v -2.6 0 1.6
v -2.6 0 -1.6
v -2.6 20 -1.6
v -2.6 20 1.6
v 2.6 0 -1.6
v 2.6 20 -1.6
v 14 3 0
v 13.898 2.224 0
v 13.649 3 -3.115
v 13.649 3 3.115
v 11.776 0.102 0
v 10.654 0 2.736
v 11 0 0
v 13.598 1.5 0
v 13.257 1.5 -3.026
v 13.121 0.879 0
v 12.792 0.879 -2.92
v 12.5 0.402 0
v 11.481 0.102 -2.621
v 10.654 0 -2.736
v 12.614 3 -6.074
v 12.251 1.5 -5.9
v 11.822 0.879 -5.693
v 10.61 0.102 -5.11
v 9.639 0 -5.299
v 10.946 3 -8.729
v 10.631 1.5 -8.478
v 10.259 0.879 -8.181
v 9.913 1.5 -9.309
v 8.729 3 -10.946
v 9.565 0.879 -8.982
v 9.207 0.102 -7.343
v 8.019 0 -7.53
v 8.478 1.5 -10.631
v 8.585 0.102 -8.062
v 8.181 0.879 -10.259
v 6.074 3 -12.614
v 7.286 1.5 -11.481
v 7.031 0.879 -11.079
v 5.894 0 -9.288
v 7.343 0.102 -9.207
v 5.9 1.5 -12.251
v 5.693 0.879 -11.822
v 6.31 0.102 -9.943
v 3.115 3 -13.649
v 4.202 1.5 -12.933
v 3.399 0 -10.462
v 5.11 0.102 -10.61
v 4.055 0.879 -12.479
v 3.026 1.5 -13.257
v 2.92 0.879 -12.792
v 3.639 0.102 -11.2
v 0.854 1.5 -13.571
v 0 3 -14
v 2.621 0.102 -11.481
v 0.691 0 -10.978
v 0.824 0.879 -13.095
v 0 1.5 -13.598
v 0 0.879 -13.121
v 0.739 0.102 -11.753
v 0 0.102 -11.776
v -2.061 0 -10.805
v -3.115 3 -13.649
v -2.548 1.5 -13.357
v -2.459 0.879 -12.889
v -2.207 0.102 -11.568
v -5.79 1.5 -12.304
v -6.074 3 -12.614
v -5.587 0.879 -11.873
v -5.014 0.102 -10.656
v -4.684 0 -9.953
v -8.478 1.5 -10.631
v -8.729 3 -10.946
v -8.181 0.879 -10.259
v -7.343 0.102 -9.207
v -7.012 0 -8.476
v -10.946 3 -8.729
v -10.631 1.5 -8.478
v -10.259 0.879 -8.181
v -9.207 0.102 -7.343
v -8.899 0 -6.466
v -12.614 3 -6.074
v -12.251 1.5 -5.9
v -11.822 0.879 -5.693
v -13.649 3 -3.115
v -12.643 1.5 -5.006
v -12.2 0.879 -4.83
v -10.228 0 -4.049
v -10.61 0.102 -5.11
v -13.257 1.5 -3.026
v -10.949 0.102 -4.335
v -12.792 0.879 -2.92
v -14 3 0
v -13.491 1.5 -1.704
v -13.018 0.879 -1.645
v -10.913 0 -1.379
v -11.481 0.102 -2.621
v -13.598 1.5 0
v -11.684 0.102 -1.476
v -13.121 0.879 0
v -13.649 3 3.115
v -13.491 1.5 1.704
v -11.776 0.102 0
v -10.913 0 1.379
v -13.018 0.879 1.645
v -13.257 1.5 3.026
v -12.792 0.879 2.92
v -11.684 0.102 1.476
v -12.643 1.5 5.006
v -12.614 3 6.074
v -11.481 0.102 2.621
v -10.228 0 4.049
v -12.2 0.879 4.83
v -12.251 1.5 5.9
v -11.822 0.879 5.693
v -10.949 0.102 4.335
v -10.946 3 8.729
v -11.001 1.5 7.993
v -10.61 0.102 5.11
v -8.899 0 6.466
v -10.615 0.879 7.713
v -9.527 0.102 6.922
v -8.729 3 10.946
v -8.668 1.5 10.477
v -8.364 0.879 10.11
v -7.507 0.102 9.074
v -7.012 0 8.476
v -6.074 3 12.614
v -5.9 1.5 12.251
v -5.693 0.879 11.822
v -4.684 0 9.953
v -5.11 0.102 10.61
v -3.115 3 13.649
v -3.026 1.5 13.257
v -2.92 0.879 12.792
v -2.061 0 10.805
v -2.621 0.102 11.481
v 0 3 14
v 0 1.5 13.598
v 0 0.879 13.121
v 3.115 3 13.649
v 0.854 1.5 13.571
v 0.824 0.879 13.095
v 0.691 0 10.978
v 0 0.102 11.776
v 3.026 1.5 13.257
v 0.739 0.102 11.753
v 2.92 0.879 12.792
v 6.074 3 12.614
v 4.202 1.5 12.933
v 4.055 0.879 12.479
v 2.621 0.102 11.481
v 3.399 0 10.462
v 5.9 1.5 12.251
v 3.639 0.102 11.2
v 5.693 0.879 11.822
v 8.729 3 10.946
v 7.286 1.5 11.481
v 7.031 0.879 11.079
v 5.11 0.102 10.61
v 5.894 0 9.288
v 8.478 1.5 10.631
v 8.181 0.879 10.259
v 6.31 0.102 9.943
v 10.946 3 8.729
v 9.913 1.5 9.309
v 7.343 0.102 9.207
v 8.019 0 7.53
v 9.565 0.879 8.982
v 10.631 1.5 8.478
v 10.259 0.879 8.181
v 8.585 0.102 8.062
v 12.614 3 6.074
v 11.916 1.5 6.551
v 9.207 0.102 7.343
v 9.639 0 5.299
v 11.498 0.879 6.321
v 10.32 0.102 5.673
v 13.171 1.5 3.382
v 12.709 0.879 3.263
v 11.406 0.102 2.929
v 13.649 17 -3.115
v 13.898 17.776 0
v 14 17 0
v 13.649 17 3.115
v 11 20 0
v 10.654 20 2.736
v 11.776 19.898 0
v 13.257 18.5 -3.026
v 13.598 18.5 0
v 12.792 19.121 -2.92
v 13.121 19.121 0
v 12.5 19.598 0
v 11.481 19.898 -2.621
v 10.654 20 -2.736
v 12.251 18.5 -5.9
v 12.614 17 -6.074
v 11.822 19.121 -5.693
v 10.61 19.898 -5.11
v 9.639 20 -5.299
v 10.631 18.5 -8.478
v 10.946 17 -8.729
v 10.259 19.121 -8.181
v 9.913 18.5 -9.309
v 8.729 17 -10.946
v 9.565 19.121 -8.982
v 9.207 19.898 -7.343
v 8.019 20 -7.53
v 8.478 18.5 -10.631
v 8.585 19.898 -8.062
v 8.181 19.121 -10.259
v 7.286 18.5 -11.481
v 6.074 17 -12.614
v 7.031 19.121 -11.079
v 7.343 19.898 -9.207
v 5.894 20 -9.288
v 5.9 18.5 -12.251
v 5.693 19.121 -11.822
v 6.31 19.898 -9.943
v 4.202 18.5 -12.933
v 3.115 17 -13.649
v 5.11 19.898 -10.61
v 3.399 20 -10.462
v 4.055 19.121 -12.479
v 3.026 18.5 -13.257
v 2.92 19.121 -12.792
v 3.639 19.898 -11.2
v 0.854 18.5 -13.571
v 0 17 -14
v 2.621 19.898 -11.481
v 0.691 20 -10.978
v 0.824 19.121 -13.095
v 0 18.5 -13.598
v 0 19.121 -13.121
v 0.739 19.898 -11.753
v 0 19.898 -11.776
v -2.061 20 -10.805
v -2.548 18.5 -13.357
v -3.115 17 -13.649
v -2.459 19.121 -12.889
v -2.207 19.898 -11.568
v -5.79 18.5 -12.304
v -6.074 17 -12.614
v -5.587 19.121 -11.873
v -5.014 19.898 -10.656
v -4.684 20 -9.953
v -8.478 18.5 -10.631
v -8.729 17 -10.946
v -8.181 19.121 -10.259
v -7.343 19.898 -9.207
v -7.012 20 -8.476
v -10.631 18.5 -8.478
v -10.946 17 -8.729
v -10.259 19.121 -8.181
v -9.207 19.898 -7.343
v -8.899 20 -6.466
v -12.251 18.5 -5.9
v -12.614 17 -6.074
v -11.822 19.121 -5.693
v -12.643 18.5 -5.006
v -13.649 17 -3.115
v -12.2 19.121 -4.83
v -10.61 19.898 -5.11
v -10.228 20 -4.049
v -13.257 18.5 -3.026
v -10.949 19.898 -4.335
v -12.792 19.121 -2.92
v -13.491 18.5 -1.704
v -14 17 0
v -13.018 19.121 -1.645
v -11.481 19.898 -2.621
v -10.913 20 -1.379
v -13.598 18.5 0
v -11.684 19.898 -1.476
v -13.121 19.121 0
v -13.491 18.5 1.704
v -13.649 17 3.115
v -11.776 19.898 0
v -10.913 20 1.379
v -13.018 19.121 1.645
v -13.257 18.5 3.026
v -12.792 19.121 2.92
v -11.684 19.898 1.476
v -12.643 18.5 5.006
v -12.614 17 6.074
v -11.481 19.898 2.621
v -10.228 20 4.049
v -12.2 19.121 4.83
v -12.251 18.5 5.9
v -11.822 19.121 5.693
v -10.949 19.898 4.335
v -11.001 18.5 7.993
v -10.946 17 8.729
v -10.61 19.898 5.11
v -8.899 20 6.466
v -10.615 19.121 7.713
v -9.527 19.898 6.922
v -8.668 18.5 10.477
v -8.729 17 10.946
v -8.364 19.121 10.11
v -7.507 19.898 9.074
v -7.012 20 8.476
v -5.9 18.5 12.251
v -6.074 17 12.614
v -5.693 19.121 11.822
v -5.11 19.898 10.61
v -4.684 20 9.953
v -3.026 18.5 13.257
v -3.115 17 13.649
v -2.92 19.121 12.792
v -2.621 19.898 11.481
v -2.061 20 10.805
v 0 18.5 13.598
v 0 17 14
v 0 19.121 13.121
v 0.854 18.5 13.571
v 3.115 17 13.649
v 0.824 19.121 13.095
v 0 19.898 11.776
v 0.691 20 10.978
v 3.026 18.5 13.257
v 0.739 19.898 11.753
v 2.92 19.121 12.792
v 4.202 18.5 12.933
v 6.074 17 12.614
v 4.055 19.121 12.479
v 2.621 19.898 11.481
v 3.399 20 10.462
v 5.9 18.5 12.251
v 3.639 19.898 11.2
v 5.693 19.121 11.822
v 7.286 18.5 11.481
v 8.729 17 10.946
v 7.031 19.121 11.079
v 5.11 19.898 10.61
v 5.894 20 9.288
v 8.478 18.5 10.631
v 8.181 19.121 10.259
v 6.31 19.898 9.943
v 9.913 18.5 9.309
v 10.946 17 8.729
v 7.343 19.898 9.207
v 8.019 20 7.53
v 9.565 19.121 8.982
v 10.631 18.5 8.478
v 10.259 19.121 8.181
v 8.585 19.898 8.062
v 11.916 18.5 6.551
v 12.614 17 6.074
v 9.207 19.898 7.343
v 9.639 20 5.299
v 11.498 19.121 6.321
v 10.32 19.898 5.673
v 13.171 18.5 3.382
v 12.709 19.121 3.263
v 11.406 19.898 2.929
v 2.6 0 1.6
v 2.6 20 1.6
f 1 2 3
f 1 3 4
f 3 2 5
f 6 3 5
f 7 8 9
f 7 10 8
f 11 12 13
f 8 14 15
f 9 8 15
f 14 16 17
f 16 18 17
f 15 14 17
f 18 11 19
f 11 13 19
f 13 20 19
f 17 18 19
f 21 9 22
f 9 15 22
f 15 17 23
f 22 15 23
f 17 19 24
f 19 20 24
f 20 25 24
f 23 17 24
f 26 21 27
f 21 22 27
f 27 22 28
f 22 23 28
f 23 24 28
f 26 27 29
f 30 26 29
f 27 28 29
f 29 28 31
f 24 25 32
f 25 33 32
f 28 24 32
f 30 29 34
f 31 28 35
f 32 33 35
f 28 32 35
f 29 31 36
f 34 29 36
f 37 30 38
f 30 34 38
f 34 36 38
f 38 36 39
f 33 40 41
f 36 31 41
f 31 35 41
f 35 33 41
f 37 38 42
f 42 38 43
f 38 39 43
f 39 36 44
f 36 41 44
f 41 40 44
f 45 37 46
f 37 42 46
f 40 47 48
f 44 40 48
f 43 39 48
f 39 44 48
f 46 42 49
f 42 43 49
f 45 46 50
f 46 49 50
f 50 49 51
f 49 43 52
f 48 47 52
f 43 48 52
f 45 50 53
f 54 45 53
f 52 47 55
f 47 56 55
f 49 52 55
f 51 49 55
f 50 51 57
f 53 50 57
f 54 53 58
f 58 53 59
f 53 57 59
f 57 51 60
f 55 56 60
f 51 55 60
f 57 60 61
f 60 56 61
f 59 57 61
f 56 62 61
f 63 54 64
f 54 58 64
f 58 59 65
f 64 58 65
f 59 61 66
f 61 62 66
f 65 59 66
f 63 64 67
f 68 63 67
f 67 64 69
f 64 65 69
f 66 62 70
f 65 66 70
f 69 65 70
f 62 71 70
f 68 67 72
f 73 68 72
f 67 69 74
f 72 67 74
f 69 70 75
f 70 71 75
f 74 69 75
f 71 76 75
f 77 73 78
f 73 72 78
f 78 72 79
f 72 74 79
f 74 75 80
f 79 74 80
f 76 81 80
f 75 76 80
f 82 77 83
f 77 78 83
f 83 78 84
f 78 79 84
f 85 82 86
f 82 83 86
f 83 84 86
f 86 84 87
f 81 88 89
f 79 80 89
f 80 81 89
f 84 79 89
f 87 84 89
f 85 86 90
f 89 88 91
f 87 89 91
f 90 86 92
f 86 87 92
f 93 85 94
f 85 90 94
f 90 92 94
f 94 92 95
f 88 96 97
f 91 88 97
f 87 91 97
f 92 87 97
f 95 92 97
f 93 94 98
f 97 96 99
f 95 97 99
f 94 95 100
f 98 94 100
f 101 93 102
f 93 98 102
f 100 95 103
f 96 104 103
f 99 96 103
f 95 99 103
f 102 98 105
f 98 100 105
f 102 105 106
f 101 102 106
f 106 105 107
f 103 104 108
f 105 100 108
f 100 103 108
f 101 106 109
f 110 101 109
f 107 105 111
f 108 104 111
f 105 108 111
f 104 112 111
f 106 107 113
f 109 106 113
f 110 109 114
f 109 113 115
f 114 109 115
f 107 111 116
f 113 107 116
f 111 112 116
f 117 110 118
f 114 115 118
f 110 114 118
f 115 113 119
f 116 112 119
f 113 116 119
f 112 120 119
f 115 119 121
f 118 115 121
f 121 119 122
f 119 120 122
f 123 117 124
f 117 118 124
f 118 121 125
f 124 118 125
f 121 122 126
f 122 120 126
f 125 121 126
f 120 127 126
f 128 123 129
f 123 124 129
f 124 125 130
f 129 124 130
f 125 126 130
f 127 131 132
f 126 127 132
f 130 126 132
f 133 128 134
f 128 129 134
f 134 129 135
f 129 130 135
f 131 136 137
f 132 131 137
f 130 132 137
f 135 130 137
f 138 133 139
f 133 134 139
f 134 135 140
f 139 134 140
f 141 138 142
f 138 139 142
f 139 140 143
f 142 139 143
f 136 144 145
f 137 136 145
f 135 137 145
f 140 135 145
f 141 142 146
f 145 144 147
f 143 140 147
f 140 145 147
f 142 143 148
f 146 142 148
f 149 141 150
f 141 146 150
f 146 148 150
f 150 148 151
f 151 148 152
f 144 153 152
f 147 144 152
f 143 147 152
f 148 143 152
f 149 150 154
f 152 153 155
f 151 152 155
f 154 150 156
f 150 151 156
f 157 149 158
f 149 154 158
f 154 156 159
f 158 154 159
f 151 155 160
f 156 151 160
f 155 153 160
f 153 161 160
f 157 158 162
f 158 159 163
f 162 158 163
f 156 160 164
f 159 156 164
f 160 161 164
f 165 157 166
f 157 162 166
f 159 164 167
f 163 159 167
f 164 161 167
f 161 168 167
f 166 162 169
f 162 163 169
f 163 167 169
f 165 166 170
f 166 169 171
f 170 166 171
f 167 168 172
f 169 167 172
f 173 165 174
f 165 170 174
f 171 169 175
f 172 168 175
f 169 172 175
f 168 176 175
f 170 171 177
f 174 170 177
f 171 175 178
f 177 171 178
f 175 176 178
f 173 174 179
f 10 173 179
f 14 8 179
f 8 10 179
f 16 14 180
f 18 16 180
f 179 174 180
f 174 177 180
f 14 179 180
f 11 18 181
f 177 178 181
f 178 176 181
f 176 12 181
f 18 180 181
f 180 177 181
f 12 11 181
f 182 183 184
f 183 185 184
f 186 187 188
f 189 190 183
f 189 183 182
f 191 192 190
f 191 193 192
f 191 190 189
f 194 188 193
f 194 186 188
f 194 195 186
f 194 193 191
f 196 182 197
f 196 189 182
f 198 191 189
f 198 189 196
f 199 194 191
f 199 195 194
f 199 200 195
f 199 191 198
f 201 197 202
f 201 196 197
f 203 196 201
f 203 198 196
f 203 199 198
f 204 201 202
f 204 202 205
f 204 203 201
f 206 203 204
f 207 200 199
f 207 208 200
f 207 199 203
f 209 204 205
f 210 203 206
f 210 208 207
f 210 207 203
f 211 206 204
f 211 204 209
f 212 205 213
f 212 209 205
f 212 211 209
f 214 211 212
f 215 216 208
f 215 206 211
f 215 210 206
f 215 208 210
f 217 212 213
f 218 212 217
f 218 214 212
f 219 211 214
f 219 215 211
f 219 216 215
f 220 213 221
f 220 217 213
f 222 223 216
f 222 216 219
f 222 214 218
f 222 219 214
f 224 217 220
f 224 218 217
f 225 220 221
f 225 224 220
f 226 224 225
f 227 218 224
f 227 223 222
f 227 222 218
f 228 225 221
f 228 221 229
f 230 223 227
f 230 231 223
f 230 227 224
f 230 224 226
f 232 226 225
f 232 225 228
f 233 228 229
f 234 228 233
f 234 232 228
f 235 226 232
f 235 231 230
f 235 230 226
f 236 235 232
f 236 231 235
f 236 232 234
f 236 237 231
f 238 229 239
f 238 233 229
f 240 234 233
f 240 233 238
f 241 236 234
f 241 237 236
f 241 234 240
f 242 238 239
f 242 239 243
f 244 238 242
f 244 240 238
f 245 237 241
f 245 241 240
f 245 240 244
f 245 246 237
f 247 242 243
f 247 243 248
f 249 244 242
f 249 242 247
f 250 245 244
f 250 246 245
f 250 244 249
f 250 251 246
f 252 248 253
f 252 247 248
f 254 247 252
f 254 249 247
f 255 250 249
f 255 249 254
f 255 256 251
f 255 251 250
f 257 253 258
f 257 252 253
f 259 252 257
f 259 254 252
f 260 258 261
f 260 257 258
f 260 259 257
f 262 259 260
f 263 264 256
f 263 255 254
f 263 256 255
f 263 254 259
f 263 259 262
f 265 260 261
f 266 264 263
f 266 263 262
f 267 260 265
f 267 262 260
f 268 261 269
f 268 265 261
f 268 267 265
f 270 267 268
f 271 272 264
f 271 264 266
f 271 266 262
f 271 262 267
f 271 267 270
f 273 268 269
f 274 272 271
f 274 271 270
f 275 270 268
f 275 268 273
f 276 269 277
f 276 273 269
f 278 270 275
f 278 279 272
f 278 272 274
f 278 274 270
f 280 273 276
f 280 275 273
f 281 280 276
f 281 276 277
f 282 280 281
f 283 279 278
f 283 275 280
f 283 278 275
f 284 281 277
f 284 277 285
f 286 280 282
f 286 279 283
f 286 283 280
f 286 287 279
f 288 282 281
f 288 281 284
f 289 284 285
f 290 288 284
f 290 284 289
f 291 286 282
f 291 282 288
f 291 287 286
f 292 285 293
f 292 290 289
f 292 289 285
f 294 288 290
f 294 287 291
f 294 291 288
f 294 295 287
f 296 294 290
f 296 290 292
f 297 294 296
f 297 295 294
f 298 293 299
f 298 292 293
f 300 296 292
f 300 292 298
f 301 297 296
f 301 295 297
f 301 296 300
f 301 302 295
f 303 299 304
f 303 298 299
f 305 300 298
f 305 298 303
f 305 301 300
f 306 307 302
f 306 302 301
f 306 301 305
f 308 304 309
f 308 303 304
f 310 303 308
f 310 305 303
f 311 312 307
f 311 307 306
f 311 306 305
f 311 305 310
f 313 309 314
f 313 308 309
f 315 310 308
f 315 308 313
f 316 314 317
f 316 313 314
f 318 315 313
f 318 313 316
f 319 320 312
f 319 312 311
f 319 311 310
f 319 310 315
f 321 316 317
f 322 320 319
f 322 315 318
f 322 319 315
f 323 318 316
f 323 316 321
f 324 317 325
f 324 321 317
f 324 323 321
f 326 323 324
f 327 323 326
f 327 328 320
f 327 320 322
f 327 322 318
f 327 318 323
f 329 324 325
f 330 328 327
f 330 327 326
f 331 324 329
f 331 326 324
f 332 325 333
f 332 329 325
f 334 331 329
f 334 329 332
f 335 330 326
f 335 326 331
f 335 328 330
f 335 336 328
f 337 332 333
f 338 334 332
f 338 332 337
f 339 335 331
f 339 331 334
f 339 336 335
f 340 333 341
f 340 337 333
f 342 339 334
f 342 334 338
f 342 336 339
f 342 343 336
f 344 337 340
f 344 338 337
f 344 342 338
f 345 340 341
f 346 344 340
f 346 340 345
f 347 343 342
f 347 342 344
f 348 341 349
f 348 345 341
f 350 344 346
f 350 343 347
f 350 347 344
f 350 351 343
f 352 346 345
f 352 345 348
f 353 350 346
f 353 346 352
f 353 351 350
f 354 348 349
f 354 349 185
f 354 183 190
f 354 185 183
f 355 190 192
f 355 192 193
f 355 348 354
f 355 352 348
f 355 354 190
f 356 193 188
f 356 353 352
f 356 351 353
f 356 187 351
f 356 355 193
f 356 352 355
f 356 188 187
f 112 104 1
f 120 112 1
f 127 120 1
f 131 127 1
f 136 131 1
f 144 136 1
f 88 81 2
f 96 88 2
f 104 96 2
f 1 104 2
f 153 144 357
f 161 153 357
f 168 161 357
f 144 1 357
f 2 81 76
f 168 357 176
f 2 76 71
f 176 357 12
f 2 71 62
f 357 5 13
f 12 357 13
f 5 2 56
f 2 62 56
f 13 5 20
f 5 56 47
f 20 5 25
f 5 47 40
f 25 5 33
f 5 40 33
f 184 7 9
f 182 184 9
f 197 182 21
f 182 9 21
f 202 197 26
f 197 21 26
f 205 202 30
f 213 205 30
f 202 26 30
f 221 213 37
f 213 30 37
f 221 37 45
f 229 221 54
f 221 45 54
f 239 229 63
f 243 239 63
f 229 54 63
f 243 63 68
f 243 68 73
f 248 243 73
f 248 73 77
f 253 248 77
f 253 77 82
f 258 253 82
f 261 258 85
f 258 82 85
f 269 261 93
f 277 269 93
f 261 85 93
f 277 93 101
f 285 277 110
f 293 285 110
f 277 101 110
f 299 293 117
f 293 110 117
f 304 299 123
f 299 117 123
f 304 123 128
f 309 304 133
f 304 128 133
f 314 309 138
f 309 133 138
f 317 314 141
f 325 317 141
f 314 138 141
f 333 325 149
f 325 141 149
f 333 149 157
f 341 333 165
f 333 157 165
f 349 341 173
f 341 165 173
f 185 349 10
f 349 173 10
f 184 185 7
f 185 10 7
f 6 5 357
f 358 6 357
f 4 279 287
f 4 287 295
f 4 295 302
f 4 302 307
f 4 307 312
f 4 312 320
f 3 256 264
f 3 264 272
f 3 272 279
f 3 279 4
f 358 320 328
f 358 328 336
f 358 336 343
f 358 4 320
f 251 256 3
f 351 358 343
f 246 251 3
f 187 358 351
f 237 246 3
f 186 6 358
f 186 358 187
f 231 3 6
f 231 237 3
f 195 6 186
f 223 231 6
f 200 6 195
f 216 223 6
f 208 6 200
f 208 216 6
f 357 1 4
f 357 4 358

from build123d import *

# Parameters (mm, degrees)
SKETCH2_R           = 14
BOSS_EXTRUDE1_DEPTH = 20
FILLET1_R           = 3
SKETCH3_W           = 5.2
SKETCH3_H           = 3.2
CUT_EXTRUDE1_DEPTH  = 21


with BuildPart() as part:
    # Sketch2 → Boss-Extrude1 (new body)
    with BuildSketch(Plane(origin=(0, 0, 0), x_dir=(1, 0, 0), z_dir=(0, 1, 0))):
        Circle(SKETCH2_R)
    extrude(amount=BOSS_EXTRUDE1_DEPTH)

    # Fillet1
    fillet1_edges = [part.edges().sort_by_distance(p)[0] for p in [
        (-14, 0, 0),
        (-14, 20, 0),
    ]]
    fillet(fillet1_edges, radius=FILLET1_R)

    # Sketch3 → Cut-Extrude1 (cut, through all)
    with BuildSketch(Plane.XZ):
        Rectangle(SKETCH3_W, SKETCH3_H)
    extrude(amount=-CUT_EXTRUDE1_DEPTH, mode=Mode.SUBTRACT)


solid = part.part
